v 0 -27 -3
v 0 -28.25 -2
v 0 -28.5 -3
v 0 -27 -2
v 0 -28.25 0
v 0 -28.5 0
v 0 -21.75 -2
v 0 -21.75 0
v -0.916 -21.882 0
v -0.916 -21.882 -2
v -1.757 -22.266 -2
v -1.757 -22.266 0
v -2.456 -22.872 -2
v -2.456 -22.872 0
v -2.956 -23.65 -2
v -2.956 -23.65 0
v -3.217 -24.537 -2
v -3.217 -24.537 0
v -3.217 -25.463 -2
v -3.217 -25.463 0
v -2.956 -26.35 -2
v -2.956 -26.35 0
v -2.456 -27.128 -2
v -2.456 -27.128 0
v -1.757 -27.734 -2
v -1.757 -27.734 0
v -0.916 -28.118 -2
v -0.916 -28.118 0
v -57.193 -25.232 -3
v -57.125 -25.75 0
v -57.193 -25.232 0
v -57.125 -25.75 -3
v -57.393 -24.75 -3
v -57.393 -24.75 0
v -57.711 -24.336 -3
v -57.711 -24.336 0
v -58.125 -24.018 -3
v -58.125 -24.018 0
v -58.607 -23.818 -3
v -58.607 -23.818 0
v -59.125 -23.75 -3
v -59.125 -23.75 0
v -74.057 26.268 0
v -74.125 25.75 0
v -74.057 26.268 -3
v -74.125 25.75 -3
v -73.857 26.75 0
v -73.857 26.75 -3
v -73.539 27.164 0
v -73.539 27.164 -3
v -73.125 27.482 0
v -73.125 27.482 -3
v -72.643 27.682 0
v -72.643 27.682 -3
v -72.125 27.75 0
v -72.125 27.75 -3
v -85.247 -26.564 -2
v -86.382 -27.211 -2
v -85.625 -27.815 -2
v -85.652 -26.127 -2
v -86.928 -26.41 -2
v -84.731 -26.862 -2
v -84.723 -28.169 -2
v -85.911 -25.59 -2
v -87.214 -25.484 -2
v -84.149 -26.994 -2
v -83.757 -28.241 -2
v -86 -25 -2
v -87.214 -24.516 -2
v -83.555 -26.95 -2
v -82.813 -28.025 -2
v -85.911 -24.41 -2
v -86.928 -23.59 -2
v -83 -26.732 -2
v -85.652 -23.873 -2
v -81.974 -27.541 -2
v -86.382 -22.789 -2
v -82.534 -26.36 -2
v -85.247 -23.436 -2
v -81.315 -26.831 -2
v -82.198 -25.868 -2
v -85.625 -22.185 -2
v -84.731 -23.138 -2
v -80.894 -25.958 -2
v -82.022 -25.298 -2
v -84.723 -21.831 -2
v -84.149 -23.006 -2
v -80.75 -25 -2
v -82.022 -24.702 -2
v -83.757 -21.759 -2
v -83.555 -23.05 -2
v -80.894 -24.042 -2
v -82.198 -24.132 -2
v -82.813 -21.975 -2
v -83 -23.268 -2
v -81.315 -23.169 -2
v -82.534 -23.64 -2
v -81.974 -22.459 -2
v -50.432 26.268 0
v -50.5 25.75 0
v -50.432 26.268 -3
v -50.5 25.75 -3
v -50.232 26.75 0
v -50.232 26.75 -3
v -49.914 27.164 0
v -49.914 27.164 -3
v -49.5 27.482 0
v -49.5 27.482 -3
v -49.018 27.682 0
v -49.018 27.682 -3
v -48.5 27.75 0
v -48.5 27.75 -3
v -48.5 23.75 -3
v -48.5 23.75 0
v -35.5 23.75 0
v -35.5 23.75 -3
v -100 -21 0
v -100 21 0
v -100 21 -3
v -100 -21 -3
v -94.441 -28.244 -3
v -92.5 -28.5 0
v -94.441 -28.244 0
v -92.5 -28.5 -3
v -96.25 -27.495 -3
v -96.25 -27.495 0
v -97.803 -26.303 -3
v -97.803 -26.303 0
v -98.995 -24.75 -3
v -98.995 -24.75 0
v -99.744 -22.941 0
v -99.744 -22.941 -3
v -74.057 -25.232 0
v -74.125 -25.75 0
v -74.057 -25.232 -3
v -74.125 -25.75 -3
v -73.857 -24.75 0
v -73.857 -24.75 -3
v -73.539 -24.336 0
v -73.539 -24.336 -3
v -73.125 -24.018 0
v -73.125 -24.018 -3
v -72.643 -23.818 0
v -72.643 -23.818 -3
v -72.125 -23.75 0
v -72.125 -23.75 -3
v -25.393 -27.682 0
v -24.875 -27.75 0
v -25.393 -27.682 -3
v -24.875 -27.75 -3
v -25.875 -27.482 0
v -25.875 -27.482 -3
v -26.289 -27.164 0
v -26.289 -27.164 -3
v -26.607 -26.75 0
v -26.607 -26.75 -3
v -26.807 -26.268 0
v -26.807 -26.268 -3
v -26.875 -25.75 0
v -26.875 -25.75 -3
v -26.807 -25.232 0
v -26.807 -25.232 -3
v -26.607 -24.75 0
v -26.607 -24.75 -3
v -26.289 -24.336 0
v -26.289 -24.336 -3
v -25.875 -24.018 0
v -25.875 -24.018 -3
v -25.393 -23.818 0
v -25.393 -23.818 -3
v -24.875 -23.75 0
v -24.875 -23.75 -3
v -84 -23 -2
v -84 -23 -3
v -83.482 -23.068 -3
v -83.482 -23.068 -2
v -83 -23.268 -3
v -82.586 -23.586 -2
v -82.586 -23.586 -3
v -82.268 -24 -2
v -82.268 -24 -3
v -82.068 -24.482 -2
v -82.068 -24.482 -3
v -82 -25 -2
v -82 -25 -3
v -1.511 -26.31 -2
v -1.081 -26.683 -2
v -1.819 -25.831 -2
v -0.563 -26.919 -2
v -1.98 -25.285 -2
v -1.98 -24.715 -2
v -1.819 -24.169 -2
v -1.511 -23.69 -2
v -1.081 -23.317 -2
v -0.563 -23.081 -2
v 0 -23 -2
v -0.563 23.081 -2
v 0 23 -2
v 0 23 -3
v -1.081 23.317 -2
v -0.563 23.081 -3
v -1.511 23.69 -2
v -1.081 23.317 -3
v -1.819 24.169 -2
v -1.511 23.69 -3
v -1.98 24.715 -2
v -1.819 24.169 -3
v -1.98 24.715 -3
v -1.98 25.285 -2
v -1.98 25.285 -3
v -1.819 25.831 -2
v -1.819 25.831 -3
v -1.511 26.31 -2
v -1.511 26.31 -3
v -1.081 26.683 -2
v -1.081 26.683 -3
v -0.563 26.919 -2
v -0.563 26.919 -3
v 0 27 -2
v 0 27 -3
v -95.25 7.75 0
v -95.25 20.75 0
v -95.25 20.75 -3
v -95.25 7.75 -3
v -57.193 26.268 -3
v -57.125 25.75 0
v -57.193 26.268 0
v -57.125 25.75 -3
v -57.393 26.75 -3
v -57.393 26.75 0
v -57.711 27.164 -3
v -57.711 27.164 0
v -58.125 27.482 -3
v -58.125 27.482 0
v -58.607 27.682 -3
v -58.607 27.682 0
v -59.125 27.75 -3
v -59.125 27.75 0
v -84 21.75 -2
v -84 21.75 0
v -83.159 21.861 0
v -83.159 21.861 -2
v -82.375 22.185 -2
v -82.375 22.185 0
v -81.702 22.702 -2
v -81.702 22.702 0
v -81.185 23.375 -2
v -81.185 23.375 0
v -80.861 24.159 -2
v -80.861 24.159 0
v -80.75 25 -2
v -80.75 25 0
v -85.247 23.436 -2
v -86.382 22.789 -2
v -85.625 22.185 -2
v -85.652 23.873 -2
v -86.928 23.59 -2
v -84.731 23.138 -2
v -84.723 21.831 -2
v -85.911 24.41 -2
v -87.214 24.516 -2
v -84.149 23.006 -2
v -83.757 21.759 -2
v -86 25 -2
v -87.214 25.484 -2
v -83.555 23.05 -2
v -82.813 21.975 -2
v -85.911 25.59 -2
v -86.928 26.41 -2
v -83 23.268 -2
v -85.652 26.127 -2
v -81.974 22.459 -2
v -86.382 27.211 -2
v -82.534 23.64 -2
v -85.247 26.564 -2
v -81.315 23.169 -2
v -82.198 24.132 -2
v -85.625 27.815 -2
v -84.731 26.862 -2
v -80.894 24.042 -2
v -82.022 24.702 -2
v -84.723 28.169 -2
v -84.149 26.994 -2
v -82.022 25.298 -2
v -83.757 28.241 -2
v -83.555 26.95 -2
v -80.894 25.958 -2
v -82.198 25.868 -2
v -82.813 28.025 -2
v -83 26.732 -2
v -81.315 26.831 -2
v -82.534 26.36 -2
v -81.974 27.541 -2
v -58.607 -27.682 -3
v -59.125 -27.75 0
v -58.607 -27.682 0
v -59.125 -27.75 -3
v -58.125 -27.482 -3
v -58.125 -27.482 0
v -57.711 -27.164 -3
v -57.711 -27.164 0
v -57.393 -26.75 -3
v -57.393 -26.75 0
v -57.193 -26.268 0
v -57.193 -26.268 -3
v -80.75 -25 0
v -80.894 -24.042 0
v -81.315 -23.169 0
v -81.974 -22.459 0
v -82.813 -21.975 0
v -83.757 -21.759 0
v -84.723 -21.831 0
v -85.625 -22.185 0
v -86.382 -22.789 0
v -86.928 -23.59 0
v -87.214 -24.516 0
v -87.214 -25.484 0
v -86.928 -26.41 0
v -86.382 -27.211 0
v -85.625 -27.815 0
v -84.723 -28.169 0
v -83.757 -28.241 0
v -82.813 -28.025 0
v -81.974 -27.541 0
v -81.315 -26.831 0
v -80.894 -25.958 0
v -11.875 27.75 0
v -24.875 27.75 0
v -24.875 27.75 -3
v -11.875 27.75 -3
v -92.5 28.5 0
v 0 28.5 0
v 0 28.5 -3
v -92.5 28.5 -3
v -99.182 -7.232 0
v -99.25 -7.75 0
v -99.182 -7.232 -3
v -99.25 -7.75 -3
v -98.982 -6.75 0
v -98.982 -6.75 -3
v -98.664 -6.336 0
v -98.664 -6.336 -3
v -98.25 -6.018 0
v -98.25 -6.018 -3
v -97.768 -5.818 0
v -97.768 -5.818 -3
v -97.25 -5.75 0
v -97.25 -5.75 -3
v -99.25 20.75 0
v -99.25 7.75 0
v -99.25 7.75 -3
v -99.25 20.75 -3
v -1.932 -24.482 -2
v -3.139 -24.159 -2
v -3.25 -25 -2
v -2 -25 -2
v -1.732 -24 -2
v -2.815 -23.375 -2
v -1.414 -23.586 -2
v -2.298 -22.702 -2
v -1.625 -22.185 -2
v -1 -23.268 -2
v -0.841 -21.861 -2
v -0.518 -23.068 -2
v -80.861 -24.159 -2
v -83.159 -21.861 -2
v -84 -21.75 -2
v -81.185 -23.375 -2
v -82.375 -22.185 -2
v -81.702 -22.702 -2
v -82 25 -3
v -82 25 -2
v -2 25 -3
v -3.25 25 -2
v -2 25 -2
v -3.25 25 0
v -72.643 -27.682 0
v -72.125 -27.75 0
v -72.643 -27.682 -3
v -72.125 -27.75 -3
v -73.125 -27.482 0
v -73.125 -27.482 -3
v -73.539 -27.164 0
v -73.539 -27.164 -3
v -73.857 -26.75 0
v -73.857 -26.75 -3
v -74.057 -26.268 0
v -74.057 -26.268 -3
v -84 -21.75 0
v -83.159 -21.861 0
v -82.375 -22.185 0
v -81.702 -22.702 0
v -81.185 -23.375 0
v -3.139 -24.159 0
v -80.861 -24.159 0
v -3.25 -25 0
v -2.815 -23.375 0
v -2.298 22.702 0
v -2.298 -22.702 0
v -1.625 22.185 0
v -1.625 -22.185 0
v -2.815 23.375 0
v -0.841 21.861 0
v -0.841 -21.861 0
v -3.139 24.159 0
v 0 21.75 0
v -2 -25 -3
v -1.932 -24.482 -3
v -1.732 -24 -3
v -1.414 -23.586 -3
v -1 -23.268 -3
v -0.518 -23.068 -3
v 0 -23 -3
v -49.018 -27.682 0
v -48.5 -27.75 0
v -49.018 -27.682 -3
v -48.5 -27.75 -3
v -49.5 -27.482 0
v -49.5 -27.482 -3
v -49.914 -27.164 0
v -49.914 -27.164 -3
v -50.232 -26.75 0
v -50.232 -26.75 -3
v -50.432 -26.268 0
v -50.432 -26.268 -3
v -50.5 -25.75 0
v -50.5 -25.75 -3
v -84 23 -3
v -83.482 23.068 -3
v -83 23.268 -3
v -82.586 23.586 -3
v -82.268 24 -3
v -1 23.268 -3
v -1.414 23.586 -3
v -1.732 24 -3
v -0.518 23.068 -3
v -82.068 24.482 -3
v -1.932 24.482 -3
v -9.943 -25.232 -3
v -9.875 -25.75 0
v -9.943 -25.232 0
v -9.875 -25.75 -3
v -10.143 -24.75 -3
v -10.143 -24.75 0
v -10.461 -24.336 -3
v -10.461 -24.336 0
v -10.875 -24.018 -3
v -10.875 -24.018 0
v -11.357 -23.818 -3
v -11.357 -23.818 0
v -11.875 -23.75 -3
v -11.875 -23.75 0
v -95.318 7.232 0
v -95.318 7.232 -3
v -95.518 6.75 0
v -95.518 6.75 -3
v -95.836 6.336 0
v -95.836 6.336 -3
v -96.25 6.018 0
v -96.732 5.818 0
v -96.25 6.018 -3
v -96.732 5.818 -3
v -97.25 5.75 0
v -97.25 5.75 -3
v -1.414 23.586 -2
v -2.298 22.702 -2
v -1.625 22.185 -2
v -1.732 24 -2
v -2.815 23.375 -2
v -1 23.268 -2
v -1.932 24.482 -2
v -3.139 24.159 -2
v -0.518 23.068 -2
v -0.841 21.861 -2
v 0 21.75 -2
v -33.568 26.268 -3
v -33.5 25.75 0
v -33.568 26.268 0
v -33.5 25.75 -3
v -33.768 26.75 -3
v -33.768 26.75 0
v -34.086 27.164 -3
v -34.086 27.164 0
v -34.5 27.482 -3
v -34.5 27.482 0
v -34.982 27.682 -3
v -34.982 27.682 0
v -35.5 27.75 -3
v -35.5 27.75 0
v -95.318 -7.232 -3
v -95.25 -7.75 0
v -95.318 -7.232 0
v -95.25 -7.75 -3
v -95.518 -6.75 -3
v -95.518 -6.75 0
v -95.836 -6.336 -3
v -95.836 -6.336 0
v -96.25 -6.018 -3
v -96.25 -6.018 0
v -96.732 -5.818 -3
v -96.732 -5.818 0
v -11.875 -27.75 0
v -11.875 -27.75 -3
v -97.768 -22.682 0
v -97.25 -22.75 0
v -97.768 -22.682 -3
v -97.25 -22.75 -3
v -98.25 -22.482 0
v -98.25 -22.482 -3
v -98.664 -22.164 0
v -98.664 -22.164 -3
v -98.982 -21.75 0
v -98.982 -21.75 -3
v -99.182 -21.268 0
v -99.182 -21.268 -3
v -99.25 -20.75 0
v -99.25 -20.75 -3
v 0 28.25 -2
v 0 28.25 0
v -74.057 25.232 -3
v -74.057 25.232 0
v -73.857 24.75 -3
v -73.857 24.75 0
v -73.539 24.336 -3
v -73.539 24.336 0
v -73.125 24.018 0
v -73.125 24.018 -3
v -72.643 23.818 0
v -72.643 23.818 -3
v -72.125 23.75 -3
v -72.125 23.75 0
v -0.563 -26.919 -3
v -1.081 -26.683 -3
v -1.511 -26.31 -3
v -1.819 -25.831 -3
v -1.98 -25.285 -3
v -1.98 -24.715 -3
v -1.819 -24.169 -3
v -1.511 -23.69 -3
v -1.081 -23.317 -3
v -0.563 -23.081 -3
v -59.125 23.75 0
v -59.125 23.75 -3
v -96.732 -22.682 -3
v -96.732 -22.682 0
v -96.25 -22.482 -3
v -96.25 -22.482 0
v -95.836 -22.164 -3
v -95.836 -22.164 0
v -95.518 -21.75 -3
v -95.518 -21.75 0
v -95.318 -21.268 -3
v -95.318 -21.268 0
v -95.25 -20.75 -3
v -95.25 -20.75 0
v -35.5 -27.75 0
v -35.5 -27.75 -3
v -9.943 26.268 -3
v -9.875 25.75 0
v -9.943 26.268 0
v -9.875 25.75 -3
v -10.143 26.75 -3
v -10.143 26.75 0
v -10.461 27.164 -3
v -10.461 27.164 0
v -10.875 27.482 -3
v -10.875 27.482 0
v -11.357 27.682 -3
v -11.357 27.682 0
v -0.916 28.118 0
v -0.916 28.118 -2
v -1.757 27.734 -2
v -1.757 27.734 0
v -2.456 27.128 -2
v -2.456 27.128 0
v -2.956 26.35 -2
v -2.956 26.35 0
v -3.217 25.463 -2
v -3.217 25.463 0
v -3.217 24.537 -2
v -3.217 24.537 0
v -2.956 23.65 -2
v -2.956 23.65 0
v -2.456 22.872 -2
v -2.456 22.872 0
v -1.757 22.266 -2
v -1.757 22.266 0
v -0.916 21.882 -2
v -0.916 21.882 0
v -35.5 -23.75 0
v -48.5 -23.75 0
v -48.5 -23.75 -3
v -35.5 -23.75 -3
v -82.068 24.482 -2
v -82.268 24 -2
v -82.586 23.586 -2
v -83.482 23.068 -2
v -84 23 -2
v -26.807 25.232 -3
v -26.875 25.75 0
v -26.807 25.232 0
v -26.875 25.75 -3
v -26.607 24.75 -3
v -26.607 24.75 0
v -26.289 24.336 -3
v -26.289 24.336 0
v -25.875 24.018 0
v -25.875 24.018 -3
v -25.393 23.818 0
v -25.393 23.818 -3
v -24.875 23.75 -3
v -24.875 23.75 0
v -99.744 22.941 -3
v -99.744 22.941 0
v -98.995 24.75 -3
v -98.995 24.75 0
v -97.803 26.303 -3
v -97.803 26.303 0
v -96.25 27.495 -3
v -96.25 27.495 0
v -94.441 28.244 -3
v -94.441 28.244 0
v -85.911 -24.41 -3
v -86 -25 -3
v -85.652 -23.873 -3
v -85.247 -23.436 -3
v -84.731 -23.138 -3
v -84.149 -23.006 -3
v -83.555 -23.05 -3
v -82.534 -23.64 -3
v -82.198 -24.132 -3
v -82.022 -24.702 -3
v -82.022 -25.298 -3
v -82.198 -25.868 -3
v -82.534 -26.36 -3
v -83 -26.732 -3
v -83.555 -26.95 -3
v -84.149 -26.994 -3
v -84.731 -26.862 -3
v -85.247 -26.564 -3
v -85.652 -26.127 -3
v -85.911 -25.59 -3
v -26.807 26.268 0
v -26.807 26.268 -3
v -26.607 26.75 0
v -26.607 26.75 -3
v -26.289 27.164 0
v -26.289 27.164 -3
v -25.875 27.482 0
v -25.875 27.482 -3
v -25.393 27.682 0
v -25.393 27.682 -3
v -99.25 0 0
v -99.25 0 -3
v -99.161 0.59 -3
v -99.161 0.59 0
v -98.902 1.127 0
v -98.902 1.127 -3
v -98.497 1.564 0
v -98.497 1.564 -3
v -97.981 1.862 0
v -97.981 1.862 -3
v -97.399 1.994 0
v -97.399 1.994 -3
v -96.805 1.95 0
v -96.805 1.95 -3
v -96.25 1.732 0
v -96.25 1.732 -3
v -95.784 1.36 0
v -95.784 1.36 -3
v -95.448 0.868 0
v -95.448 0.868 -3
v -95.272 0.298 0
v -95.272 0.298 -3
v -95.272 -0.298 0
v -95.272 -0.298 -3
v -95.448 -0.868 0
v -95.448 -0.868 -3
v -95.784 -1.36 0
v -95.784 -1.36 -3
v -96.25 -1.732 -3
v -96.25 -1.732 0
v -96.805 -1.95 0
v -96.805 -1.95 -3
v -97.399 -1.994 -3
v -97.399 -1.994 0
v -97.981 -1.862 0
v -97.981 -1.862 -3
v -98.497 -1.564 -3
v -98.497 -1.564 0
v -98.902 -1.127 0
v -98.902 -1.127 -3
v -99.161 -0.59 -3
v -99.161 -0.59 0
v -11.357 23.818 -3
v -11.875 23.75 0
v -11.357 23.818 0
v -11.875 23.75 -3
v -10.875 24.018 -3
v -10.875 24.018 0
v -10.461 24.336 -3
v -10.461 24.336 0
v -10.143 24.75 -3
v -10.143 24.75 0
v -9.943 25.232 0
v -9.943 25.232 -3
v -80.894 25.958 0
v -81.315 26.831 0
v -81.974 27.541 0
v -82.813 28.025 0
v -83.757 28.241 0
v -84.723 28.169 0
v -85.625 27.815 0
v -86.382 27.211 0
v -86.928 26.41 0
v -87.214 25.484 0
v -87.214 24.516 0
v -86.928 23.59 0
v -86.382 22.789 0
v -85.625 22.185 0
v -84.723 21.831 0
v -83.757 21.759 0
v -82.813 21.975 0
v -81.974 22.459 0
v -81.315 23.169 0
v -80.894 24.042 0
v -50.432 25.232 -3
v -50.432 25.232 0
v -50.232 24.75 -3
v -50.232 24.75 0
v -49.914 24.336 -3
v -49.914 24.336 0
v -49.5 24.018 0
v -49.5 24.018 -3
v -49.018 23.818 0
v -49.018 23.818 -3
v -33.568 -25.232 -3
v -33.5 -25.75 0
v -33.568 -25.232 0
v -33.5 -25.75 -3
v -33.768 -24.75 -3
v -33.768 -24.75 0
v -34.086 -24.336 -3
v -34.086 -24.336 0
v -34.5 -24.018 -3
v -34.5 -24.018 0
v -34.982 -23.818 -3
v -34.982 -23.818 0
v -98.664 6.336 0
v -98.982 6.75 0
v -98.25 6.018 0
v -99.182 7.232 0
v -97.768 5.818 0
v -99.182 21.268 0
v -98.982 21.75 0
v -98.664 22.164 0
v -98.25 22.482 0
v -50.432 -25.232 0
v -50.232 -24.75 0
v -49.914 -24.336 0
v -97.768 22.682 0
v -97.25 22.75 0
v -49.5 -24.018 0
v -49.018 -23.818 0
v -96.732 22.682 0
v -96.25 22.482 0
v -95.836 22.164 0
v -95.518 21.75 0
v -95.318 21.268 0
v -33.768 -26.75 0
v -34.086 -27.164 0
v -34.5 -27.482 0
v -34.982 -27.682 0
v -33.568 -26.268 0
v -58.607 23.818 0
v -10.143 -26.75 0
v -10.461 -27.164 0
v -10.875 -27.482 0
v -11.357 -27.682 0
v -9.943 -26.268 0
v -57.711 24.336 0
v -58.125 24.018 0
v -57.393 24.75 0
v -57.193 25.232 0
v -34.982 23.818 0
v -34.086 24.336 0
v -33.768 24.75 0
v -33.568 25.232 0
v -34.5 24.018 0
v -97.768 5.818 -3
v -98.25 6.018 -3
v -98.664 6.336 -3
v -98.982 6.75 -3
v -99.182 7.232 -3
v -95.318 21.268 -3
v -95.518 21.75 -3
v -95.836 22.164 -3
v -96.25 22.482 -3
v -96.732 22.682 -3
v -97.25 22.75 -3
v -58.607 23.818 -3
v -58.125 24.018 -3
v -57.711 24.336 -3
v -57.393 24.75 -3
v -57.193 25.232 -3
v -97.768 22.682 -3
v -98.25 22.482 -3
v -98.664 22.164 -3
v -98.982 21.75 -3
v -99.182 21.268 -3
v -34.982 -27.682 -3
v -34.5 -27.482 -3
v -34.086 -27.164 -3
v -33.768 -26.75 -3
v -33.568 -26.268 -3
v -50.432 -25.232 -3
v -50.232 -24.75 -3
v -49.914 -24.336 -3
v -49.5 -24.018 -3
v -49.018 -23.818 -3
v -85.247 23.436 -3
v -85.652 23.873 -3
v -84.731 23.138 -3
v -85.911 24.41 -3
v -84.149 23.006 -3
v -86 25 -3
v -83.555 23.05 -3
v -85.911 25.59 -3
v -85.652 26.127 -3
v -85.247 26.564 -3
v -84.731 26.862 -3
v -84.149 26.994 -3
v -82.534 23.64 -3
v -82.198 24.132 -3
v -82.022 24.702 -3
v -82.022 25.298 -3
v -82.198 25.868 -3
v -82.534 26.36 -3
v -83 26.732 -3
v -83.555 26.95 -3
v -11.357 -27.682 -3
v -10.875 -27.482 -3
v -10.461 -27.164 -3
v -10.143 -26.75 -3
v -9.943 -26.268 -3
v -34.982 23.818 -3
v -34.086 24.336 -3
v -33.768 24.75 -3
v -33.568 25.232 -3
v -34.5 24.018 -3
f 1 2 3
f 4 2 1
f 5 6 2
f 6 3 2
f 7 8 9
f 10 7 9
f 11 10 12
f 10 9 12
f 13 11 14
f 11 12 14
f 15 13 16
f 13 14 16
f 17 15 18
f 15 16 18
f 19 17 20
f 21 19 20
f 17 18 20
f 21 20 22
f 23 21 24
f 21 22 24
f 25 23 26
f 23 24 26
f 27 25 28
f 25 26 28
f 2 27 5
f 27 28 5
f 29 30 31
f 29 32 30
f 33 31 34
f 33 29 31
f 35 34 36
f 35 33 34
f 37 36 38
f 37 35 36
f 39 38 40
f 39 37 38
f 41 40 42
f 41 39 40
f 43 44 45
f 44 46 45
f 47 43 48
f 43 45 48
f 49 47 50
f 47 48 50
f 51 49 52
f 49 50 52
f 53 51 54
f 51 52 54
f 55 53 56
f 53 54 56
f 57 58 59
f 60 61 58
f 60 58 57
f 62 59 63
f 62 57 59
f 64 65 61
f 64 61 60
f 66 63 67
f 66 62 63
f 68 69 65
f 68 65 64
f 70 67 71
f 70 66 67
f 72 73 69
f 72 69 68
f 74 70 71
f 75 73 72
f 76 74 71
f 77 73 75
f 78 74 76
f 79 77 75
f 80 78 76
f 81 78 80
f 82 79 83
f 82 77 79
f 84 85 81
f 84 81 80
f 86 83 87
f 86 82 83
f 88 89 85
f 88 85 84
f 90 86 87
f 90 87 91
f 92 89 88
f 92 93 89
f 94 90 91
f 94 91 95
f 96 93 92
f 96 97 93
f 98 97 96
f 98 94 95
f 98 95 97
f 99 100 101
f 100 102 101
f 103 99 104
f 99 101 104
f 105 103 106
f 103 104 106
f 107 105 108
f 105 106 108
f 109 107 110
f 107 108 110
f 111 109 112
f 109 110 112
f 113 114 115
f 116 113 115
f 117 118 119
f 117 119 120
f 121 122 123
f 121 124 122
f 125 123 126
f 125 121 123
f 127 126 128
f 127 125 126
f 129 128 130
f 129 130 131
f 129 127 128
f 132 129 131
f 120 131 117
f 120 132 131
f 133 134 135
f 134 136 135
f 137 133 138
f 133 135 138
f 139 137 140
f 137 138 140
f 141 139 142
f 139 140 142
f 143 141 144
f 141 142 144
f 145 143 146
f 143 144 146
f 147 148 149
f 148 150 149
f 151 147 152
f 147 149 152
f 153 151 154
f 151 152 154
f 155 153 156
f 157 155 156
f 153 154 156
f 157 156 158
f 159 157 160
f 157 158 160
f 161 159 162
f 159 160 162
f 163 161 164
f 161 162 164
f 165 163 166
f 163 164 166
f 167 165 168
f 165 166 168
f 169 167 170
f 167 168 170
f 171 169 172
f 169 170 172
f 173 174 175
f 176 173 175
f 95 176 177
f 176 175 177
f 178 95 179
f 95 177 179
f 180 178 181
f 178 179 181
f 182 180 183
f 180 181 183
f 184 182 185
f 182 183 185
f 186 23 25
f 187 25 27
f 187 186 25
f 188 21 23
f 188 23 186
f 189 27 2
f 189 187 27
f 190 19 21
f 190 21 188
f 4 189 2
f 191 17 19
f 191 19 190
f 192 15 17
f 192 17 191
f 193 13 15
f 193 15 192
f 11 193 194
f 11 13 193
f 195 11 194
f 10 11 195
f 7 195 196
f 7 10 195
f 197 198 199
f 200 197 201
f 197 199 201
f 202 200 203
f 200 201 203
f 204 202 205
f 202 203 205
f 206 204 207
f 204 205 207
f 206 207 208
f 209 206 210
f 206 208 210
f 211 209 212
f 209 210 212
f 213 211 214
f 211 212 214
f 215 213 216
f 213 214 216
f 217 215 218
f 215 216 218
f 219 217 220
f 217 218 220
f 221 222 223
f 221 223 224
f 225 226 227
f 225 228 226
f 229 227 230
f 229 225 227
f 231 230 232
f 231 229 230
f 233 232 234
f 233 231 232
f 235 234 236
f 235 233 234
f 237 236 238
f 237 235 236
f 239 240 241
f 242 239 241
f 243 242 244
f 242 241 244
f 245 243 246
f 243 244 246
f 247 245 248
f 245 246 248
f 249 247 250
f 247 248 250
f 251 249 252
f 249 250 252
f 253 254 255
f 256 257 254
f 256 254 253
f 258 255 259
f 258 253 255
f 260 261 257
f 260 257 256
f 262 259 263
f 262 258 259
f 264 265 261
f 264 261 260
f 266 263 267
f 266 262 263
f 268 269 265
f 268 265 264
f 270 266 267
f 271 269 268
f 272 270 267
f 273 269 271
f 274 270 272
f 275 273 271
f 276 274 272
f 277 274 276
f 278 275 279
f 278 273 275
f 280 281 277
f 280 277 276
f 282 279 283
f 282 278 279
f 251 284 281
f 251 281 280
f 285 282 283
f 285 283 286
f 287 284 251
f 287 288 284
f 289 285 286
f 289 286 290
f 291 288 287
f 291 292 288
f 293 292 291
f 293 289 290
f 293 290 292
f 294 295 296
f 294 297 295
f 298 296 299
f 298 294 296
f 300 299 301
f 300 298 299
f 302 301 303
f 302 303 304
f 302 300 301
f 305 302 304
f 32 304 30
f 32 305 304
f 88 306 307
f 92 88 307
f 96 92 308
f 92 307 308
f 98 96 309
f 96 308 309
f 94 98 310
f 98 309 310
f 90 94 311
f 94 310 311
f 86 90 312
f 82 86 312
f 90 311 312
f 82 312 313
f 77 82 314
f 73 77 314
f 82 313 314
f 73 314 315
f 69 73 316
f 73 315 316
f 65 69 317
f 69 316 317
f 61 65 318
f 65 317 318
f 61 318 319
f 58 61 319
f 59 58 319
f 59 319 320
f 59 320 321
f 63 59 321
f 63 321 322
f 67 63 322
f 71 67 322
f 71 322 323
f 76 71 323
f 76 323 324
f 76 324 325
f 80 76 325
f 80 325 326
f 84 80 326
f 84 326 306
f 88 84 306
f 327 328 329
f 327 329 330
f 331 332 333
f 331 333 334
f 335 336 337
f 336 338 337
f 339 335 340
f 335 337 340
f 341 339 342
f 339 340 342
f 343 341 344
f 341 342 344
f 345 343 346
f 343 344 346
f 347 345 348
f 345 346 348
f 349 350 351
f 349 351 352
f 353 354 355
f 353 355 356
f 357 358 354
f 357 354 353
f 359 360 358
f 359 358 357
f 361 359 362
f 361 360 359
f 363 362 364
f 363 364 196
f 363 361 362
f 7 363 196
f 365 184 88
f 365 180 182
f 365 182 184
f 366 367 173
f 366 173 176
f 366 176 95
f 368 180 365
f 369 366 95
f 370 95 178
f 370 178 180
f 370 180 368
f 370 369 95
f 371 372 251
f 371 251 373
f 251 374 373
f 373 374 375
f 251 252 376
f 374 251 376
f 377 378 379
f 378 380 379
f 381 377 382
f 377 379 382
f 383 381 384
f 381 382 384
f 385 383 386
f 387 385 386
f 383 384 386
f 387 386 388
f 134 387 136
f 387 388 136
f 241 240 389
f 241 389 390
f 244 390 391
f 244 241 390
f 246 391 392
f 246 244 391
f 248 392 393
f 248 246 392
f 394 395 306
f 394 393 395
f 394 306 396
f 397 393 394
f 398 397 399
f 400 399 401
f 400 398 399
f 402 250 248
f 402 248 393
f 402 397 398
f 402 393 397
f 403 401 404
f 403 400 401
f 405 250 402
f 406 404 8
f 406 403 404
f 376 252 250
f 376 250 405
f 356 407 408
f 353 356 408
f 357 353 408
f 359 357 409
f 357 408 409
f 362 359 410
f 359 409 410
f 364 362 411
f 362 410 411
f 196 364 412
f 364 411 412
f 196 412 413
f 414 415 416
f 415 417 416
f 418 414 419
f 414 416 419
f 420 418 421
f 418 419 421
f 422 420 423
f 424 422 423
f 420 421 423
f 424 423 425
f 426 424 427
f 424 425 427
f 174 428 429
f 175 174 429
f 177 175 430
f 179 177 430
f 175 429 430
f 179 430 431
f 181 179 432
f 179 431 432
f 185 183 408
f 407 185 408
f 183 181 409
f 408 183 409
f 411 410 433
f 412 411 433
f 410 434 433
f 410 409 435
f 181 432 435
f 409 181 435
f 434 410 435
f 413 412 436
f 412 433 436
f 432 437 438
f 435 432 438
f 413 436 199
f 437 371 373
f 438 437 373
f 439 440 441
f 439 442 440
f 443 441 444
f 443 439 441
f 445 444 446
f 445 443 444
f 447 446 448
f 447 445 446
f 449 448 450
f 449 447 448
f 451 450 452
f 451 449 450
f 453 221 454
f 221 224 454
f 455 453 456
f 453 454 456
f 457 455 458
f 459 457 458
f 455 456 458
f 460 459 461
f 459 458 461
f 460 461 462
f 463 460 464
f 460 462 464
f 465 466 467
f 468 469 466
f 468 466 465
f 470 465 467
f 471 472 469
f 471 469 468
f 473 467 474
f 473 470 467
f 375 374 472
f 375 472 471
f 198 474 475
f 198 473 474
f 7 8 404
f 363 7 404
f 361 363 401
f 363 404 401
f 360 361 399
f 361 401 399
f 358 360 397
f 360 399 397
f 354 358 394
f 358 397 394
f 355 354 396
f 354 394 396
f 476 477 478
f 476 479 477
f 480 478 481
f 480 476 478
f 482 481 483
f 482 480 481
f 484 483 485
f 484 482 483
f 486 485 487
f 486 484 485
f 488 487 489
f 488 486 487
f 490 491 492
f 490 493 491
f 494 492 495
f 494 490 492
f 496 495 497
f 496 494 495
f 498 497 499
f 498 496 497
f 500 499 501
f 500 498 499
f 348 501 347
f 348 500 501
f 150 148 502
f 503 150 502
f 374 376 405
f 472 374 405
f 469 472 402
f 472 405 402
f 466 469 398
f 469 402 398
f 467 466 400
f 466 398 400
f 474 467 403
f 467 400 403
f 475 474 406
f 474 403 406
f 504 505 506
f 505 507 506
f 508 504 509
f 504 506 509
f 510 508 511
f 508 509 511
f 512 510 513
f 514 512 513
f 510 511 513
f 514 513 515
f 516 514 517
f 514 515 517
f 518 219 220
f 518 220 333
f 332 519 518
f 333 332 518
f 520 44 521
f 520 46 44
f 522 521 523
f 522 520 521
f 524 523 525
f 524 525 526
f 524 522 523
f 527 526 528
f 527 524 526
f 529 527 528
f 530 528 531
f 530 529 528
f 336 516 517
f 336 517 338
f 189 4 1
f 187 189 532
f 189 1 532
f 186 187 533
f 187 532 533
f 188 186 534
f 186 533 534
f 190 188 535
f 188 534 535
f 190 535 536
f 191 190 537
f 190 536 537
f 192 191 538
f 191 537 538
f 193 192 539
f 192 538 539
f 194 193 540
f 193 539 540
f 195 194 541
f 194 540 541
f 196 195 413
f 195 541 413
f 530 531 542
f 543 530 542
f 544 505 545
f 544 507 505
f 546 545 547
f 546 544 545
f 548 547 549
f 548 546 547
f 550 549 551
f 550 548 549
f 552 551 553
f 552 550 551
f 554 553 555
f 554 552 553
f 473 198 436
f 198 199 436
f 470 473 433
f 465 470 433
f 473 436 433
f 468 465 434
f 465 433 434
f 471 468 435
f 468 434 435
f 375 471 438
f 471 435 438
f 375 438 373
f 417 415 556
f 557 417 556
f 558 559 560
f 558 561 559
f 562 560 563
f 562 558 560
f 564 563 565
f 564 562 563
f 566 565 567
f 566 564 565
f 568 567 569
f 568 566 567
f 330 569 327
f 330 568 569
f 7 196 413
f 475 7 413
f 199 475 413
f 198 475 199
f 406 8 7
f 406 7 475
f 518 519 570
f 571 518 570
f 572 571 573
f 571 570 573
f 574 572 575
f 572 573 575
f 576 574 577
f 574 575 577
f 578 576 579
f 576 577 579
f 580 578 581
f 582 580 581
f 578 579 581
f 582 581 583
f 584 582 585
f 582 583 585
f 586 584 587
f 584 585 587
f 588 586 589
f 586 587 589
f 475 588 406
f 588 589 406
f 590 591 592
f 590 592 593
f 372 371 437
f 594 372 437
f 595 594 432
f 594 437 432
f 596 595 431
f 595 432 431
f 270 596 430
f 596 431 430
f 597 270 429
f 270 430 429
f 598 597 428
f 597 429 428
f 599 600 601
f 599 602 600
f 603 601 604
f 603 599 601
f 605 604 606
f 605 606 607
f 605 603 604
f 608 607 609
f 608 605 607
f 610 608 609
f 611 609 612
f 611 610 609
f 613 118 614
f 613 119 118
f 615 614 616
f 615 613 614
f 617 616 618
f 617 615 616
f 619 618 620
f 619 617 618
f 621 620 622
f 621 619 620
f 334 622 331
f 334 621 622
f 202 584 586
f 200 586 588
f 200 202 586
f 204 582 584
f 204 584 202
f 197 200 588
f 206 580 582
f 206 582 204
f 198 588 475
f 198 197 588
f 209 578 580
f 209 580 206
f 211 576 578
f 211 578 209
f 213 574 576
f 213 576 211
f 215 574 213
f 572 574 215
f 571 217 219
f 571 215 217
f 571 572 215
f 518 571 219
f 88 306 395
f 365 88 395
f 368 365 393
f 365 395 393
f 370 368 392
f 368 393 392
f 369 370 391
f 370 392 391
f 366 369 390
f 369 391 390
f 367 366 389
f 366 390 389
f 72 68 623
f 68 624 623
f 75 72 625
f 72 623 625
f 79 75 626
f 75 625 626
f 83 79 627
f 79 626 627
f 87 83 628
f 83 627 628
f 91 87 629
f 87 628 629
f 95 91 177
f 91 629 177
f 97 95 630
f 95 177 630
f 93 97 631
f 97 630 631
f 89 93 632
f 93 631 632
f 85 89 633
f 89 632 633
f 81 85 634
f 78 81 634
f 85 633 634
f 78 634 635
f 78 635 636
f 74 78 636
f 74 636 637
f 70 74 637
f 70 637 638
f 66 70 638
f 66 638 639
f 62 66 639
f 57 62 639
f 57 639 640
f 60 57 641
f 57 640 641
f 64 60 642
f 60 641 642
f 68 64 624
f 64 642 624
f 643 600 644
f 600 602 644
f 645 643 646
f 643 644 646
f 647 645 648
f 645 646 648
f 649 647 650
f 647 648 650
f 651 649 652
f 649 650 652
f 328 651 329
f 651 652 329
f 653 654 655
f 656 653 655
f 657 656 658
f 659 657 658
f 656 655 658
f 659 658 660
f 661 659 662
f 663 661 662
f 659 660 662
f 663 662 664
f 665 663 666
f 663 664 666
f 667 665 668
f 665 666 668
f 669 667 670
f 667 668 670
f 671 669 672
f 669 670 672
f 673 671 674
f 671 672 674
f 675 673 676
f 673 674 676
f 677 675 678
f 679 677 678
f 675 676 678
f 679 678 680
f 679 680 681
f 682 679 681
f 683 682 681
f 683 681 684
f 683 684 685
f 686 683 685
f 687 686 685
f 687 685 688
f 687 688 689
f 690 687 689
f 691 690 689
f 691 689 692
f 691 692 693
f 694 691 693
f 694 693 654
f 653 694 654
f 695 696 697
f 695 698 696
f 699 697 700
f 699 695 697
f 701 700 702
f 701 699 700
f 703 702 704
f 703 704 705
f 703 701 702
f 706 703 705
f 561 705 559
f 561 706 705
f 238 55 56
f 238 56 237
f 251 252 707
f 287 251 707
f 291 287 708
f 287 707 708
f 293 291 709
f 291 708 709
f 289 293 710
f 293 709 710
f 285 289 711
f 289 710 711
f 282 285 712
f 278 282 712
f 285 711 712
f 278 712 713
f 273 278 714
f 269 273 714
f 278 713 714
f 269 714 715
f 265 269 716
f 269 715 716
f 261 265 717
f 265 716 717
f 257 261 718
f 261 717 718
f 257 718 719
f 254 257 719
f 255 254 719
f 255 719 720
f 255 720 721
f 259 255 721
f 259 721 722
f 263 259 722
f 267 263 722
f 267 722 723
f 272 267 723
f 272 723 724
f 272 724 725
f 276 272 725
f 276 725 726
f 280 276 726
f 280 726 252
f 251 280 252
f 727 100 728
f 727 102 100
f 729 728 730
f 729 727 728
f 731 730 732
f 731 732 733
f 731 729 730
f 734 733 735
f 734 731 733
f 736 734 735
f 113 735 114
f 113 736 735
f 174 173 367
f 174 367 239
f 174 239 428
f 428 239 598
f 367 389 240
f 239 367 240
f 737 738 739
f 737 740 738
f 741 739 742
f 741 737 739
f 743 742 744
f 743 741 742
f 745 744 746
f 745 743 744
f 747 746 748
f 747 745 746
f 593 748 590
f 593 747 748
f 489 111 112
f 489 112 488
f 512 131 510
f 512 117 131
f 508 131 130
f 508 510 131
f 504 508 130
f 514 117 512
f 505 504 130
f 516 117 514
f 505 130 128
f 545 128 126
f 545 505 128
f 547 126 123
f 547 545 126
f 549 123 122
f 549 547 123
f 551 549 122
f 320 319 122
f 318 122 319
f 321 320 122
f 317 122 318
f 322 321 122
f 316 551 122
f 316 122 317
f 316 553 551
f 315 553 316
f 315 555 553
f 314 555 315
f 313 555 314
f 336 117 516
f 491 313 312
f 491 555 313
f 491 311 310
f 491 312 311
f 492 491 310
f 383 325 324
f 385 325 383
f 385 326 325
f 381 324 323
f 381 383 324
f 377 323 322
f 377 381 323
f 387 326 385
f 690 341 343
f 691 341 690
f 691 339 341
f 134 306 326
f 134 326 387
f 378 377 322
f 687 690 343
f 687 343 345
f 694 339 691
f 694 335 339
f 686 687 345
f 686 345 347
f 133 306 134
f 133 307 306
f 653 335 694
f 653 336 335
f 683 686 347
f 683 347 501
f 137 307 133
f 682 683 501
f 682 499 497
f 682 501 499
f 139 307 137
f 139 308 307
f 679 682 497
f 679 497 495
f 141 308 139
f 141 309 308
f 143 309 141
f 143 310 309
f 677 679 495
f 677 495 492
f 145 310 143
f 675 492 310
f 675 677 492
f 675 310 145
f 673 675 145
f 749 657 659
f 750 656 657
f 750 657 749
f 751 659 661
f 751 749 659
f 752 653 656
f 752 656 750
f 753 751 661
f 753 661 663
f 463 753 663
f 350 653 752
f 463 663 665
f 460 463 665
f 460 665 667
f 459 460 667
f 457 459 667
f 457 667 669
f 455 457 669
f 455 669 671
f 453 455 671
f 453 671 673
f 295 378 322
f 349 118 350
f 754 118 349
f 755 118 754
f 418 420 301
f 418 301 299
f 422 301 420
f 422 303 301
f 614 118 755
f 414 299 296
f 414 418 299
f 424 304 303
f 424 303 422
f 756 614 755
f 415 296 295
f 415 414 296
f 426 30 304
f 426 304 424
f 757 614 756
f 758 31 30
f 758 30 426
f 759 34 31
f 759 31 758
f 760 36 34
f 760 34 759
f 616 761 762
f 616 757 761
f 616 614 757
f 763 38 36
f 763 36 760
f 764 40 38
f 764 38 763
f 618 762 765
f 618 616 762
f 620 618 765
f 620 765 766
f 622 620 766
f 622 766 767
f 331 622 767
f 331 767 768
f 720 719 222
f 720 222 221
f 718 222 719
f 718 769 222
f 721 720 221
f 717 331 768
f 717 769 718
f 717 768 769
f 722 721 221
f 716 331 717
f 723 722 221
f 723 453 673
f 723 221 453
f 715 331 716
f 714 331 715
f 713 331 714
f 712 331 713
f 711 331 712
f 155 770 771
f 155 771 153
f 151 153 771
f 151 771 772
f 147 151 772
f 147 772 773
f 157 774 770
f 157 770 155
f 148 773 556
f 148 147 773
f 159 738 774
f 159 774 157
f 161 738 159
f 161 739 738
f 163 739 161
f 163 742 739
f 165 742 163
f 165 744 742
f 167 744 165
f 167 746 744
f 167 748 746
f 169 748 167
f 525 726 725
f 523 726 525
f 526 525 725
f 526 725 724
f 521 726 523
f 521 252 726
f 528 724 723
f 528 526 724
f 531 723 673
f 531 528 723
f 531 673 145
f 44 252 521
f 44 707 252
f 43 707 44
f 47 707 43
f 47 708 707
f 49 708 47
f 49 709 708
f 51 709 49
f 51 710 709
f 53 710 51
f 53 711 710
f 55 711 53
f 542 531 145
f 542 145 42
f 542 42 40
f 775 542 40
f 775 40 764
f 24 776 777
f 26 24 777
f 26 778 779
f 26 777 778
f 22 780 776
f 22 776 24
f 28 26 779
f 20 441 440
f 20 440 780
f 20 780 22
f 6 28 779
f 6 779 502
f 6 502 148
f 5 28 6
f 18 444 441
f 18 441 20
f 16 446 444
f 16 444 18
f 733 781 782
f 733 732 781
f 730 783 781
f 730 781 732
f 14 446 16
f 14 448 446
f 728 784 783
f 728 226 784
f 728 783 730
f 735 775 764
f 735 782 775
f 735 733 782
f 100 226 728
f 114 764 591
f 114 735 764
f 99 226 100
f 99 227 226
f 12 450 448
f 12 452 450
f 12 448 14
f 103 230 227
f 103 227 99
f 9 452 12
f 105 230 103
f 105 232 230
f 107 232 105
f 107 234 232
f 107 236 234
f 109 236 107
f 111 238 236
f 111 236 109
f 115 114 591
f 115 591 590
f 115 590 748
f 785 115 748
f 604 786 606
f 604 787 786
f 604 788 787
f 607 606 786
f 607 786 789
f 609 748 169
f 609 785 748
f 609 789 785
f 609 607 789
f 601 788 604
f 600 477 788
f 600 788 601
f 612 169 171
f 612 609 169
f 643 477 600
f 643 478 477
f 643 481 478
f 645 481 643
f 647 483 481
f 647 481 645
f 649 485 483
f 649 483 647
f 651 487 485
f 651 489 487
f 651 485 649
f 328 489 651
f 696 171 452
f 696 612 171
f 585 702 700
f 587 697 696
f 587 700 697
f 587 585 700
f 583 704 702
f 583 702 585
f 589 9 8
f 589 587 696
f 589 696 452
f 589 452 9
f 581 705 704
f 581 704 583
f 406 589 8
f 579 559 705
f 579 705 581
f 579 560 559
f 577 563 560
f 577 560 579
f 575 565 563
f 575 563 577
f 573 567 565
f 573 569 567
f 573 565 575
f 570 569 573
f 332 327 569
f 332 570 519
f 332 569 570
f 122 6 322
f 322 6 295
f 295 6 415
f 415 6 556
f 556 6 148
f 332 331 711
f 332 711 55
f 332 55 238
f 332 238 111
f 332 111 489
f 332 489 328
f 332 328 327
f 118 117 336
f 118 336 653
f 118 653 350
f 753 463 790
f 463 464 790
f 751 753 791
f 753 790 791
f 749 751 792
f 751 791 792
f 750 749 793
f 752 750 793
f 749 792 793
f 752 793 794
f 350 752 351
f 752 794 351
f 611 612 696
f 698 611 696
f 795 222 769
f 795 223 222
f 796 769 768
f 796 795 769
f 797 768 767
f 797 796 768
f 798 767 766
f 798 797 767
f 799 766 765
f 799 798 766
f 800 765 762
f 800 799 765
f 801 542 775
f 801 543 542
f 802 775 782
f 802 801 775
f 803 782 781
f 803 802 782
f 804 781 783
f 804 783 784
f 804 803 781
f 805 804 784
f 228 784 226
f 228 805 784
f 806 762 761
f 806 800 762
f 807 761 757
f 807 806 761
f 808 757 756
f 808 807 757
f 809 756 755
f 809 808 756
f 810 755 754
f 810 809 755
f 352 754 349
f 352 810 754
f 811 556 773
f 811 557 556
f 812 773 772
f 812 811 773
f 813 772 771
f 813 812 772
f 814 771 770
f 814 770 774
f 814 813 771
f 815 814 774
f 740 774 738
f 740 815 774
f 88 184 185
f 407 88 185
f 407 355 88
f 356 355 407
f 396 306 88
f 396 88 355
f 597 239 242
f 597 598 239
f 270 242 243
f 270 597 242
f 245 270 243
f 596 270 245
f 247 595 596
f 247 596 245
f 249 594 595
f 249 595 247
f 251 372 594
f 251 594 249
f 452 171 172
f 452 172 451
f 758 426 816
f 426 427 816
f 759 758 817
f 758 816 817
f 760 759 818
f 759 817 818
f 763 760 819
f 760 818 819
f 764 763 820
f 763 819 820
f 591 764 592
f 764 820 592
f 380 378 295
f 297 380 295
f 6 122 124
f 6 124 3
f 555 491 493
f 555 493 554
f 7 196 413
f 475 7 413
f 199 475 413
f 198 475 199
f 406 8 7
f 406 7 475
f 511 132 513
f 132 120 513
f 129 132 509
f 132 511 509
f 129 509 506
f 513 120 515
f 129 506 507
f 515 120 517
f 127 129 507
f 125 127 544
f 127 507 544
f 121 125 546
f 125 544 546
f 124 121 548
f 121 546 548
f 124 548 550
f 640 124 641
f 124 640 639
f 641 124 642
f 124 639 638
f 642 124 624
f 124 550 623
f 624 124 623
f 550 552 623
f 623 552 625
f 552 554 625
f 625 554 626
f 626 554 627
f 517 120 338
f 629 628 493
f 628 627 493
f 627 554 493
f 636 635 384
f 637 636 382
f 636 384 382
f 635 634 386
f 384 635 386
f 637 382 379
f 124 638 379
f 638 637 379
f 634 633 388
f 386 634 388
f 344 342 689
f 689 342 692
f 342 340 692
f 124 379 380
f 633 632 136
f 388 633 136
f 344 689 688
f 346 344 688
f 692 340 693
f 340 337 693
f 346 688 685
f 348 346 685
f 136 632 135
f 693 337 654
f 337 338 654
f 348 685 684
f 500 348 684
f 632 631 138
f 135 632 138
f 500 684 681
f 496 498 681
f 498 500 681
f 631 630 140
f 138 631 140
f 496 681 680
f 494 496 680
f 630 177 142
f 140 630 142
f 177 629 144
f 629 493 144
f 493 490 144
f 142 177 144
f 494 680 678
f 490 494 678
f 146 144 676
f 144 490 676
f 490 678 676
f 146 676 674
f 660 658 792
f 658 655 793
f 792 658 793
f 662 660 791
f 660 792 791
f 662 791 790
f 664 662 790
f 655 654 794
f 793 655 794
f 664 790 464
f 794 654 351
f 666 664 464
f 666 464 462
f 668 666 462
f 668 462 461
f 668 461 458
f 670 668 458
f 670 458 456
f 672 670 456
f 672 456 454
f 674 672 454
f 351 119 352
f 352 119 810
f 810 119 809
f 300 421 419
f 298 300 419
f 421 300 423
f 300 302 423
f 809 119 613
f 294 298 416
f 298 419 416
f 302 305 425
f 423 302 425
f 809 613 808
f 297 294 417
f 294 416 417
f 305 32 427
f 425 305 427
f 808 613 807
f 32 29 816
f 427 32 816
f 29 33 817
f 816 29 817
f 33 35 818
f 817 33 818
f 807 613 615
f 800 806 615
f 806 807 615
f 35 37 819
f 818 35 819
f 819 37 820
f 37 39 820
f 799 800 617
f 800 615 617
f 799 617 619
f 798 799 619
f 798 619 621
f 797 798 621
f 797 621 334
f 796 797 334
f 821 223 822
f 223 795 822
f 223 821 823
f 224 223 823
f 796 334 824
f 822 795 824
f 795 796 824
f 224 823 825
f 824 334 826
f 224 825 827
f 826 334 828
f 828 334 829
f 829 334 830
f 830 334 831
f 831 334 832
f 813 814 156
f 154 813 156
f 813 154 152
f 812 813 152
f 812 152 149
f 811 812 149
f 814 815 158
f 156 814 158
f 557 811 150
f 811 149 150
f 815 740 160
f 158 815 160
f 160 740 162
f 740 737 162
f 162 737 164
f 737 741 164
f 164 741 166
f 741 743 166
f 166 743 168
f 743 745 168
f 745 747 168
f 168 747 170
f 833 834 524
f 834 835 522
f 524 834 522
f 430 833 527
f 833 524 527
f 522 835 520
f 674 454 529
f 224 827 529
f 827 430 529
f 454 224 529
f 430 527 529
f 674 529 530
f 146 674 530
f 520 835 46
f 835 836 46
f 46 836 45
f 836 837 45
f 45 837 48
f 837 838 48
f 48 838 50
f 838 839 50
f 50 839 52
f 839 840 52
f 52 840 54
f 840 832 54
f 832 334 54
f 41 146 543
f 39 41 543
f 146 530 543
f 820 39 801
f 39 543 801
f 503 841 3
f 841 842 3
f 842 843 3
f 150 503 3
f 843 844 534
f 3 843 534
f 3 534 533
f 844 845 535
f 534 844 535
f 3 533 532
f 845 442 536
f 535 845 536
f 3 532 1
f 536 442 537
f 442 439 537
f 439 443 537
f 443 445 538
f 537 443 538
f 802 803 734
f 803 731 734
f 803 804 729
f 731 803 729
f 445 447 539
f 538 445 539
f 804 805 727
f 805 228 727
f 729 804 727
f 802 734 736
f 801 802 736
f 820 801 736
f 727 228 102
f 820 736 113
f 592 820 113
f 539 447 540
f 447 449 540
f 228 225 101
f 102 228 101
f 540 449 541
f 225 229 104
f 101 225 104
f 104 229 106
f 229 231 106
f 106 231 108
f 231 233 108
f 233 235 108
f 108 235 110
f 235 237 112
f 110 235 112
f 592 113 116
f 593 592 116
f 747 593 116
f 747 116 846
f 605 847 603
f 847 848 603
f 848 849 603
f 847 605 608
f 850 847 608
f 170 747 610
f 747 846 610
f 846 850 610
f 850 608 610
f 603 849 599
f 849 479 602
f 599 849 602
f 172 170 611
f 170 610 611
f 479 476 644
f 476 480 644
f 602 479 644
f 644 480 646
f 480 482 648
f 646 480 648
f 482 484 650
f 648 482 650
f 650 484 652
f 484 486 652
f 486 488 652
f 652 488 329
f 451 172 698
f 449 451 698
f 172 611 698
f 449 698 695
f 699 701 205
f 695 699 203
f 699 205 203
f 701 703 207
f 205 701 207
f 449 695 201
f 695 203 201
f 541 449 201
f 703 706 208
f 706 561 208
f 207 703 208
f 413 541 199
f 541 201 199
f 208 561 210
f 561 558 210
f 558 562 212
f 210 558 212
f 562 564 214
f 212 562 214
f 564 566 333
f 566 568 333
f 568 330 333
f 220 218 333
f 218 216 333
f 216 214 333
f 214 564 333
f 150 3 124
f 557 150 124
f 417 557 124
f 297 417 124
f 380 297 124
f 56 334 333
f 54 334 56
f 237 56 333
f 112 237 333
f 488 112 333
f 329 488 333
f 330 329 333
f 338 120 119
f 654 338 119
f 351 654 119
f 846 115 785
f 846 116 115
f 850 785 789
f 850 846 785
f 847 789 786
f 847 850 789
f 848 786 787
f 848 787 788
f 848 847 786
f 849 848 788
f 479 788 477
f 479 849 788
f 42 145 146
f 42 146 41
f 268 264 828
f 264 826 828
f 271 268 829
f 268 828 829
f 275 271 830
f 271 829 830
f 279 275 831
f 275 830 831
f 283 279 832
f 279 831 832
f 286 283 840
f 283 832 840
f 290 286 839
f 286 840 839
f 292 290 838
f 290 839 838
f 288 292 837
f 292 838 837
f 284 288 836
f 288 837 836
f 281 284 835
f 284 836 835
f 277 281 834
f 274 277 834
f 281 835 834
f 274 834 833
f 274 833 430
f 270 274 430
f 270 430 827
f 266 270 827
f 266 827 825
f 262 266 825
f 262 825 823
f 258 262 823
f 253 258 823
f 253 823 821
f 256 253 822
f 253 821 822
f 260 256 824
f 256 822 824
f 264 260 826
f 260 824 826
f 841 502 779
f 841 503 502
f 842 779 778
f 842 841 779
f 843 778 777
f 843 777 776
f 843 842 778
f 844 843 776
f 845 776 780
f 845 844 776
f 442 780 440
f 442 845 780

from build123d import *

# Parameters (mm, degrees)
F1_W             = 84
F1_H             = 50
F2_DEPTH         = 3
F0_W             = 17
F0_H             = 4
F3_D             = 4
F3_DEPTH         = 3
F3_CBORE_D       = 6.5
F3_CBORE_DEPTH   = 2
F3_TIP           = 1.2017212381
F3_2_D           = 4
F3_2_DEPTH       = 3
F3_2_CBORE_D     = 6.5
F3_2_CBORE_DEPTH = 2
F3_2_TIP         = 1.2017212381
F4_D             = 4
F5_R             = 1.99999
F6_R             = 2
F7_R             = 7.5


# Not quite as in the source:
# - a fillet or chamfer is up to 0.001 mm smaller than in the source, because OpenCascade refuses the exact size


with BuildPart() as f2:
    # F1 (on Top) → F2 (new body)
    with BuildSketch(Plane.XY):
        with Locations((-42, 0)):
            Rectangle(F1_W, F1_H)
    extrude(amount=-F2_DEPTH)

    # F3
    with Locations(Plane.XY):
        with Locations((-84, 25), (0, 25), (0, -25), (-84, -25)):
            CounterBoreHole(F3_D / 2, F3_CBORE_D / 2, F3_CBORE_DEPTH, depth=F3_DEPTH)
            with Locations((0, 0, -(F3_DEPTH + F3_TIP / 2))):  # 118° drill point
                Cone(0, F3_D / 2, F3_TIP, mode=Mode.SUBTRACT)


with BuildPart() as f2b:
    # F0 (on Top) → F2, piece 2 (new body)
    with BuildSketch(Plane.XY):
        Polygon((-97.75, -28.5), (0, -28.5), (0, 25.7993545383), (0, 28.5), (-97.75, 28.5), (-97.75, 25.7993545383), (-97.75, 22.75), (-95.25, 22.75), (-95.25, 5.75), (-97.75, 5.75), (-97.75, 0), (-97.75, -5.75), (-95.25, -5.75), (-95.25, -22.75), (-97.75, -22.75), align=None)
        with Locations((-65.625, -25.75)):
            Rectangle(F0_W, F0_H, mode=Mode.SUBTRACT)
        with Locations((-42, -25.75)):
            Rectangle(F0_W, F0_H, mode=Mode.SUBTRACT)
        with Locations((-18.375, -25.75)):
            Rectangle(F0_W, F0_H, mode=Mode.SUBTRACT)
        with Locations((-65.625, 25.7500003576)):
            Rectangle(F0_W, F0_H, mode=Mode.SUBTRACT)
        with Locations((-42, 25.7500003576)):
            Rectangle(F0_W, F0_H, mode=Mode.SUBTRACT)
        with Locations((-18.375, 25.7500003576)):
            Rectangle(F0_W, F0_H, mode=Mode.SUBTRACT)
        Polygon((-100, -28.5), (-97.75, -28.5), (-97.75, -22.75), (-99.25, -22.75), (-99.25, -5.75), (-97.75, -5.75), (-97.75, 0), (-97.75, 5.75), (-99.25, 5.75), (-99.25, 22.75), (-97.75, 22.75), (-97.75, 25.7993545383), (-97.75, 28.5), (-100, 28.5), align=None)
    extrude(amount=-F2_DEPTH)

    # F3#2
    with Locations(Plane.XY):
        with Locations((-84, 25), (0, 25), (0, -25), (-84, -25)):
            CounterBoreHole(F3_2_D / 2, F3_2_CBORE_D / 2, F3_2_CBORE_DEPTH, depth=F3_2_DEPTH)
            with Locations((0, 0, -(F3_2_DEPTH + F3_2_TIP / 2))):  # 118° drill point
                Cone(0, F3_2_D / 2, F3_2_TIP, mode=Mode.SUBTRACT)

    # F4 (through all)
    with Locations(Plane.XY):
        with Locations((-97.25, 0)):
            Hole(F4_D / 2)

    # F5 (radius 2 in the source; OpenCascade refuses exactly that, so slightly less here)
    f5_edges = [f2b.edges().sort_by_distance(p)[0] for p in [
        (-99.25, 22.75, -1.5),
        (-95.25, 22.75, -1.5),
        (-99.25, 5.75, -1.5),
        (-95.25, 5.75, -1.5),
        (-99.25, -5.75, -1.5),
        (-95.25, -5.75, -1.5),
        (-95.25, -22.75, -1.5),
        (-99.25, -22.75, -1.5),
        (-74.125, -27.75, -1.5),
        (-50.5, -27.75, -1.5),
        (-57.125, -27.75, -1.5),
        (-9.875, -27.75, -1.5),
        (-33.5, -27.75, -1.5),
        (-26.875, -27.75, -1.5),
        (-9.875, 27.75, -1.5),
        (-33.5, 27.75, -1.5),
        (-57.125, 27.75, -1.5),
        (-74.125, 27.75, -1.5),
        (-50.5, 27.75, -1.5),
        (-26.875, 27.75, -1.5),
    ]]
    fillet(f5_edges, radius=F5_R)

    # F6
    f6_edges = [f2b.edges().sort_by_distance(p)[0] for p in [
        (-74.125, 23.75, -1.5),
        (-57.125, 23.75, -1.5),
        (-50.5, 23.75, -1.5),
        (-33.5, 23.75, -1.5),
        (-26.875, 23.75, -1.5),
        (-9.875, 23.75, -1.5),
        (-9.875, -23.75, -1.5),
        (-26.875, -23.75, -1.5),
        (-50.5, -23.75, -1.5),
        (-33.5, -23.75, -1.5),
        (-57.125, -23.75, -1.5),
        (-74.125, -23.75, -1.5),
    ]]
    fillet(f6_edges, radius=F6_R)

    # F7
    f7_edges = [f2b.edges().sort_by_distance(p)[0] for p in [
        (-100, 28.5, -1.5),
        (-100, -28.5, -1.5),
    ]]
    fillet(f7_edges, radius=F7_R)


solid = Compound([f2.part, f2b.part])
